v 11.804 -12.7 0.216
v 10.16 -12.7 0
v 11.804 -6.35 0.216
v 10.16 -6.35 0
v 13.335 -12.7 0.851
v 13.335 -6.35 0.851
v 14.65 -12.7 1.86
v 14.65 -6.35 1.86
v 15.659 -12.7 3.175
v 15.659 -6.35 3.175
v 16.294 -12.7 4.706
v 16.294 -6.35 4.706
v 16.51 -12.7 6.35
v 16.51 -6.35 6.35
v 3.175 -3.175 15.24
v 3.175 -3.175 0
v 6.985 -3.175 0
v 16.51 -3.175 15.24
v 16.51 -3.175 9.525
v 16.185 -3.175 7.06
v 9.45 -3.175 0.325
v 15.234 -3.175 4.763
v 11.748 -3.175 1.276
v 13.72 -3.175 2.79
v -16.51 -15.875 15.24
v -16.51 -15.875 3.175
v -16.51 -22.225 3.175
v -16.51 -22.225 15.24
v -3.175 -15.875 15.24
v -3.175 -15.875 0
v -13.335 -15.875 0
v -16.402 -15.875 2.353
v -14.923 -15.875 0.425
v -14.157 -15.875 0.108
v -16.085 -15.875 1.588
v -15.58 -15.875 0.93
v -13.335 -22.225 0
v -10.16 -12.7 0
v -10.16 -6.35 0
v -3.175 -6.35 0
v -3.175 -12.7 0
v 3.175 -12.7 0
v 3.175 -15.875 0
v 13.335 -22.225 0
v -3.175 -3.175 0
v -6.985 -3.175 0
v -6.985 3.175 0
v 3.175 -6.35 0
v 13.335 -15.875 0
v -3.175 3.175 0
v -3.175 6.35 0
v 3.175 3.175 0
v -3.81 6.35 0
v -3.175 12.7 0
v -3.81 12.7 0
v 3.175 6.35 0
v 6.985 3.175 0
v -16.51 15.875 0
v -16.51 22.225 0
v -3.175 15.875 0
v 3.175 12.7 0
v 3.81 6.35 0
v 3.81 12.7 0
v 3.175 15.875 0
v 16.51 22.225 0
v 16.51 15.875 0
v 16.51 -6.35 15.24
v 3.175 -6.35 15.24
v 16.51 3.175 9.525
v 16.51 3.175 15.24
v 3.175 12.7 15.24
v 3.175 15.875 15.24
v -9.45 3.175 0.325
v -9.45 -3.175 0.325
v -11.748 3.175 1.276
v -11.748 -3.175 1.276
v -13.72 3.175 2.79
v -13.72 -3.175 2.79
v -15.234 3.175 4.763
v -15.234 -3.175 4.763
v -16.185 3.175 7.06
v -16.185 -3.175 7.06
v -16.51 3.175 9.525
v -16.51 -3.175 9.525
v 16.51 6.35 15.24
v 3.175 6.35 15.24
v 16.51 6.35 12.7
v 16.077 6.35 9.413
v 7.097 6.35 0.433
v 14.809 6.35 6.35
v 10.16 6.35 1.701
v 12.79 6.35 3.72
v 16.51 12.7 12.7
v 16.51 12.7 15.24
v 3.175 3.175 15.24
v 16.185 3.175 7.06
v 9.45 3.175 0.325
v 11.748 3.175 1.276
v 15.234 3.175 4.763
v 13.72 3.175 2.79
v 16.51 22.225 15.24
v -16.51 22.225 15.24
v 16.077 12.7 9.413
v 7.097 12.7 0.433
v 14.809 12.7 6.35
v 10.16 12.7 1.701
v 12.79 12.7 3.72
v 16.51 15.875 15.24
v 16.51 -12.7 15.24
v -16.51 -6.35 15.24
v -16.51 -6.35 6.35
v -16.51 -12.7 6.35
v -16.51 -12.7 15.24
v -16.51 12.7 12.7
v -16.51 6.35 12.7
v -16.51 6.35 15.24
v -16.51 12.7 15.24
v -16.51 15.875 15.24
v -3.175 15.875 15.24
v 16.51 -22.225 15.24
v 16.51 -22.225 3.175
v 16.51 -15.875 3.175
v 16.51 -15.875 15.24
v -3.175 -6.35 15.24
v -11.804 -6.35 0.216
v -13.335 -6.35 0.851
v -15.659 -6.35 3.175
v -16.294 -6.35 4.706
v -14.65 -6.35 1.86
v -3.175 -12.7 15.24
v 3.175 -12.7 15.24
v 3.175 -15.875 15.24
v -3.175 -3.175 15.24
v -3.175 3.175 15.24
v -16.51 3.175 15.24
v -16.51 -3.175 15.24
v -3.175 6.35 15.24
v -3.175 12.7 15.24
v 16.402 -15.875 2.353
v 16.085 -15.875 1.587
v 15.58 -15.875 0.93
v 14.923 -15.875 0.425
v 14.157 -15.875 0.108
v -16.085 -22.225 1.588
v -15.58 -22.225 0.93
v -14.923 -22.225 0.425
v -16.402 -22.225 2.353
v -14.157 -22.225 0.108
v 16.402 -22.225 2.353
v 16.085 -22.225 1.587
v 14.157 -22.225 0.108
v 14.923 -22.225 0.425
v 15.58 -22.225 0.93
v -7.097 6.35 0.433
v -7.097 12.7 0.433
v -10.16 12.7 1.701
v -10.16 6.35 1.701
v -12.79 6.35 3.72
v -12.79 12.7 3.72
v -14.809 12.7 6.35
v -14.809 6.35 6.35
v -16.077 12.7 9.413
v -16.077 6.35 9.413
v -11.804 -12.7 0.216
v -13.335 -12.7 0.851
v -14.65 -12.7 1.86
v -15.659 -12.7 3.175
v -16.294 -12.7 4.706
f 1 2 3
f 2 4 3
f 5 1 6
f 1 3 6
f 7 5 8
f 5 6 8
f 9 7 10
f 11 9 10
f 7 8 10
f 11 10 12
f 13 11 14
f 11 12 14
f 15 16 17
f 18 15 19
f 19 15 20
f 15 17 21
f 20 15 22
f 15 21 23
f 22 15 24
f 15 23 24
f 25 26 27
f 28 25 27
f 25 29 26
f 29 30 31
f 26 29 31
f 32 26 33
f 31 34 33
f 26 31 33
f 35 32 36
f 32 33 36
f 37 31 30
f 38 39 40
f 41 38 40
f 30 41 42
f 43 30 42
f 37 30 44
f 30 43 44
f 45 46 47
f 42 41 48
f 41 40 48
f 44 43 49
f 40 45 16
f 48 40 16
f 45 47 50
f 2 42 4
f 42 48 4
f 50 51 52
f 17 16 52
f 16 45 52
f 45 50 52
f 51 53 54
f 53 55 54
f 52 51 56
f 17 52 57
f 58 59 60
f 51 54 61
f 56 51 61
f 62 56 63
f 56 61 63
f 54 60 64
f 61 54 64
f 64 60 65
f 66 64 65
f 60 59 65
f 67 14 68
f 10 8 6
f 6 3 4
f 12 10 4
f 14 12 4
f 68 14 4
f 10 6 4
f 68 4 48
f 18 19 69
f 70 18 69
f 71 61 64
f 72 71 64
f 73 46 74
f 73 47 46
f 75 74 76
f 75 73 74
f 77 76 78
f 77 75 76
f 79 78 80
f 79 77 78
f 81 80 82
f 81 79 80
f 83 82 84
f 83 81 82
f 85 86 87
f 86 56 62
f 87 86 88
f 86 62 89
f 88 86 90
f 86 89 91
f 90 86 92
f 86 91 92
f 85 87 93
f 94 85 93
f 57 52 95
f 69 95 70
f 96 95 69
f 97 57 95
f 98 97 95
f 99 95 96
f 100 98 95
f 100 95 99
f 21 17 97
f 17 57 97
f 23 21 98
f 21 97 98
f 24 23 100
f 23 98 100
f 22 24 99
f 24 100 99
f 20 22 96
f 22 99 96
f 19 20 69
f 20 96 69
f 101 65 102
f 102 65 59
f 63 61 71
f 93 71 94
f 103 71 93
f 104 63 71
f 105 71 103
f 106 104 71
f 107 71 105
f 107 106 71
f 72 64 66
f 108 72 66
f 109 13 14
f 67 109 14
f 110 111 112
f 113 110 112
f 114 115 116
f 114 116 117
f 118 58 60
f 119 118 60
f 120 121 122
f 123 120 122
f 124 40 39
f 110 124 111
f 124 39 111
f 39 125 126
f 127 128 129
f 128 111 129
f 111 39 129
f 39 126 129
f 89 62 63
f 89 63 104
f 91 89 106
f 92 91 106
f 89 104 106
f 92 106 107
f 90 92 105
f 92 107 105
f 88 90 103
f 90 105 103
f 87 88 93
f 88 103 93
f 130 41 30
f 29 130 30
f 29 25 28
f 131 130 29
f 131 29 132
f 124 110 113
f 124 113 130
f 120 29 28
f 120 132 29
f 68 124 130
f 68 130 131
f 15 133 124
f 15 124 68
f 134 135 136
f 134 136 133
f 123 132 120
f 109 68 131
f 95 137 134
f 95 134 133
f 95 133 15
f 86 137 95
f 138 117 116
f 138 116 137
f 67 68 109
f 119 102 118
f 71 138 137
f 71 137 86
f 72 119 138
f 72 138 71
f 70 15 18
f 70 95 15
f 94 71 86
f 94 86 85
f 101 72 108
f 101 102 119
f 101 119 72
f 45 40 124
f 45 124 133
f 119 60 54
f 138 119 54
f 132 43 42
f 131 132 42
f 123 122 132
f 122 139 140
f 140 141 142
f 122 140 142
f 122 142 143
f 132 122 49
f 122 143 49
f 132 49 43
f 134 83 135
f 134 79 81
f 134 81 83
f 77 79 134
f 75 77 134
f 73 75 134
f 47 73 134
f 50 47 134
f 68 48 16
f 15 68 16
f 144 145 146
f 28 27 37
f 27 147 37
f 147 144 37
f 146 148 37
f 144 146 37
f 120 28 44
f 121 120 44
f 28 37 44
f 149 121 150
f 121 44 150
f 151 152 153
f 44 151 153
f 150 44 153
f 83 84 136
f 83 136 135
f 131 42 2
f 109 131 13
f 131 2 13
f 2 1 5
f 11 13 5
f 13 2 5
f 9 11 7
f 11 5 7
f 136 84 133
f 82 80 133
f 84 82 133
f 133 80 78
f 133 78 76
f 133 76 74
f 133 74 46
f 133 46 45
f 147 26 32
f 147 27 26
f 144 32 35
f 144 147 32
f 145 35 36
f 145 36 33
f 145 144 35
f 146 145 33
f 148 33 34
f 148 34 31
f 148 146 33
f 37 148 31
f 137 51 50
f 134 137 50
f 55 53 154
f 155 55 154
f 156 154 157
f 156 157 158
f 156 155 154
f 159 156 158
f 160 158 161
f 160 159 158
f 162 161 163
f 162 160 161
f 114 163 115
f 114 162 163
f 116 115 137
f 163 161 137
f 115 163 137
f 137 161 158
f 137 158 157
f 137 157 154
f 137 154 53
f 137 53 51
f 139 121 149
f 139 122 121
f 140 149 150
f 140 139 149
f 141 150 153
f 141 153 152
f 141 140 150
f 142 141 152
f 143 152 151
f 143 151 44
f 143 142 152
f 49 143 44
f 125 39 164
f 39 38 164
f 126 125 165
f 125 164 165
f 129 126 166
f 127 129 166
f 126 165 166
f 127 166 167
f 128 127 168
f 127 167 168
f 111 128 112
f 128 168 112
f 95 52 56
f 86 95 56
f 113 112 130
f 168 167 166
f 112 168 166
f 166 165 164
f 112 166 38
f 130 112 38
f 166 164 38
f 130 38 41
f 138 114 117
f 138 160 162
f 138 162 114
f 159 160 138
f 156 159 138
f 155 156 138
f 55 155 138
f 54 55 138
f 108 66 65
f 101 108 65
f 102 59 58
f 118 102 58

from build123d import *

# Parameters (mm, degrees)
F0_W     = 6.35
F0_H     = 3.175
F0_H_2   = 6.35
F0_W_2   = 13.335
F1_DEPTH = 15.24
F2_R     = 3.175
F3_R     = 6.35
F4_R     = 9.525
F5_R     = 12.7


with BuildPart() as f1:
    # F0 (on Top) → F1 (new body)
    with BuildSketch(Plane.XY):
        Polygon((-16.51, 15.875), (-3.175, 15.875), (3.175, 15.875), (16.51, 15.875), (16.51, 22.225), (-16.51, 22.225), align=None)
        with Locations((0, 14.2875)):
            Rectangle(F0_W, F0_H)
        with Locations((0, 9.525)):
            Rectangle(F0_W, F0_H_2)
        with Locations((-9.8425, 9.525)):
            Rectangle(F0_W_2, F0_H_2)
        with Locations((9.8425, 9.525)):
            Rectangle(F0_W_2, F0_H_2)
        with Locations((0, 4.7625)):
            Rectangle(F0_W, F0_H)
        Rectangle(F0_W, F0_H_2)
        with Locations((9.8425, 0)):
            Rectangle(F0_W_2, F0_H_2)
        with Locations((-9.8425, 0)):
            Rectangle(F0_W_2, F0_H_2)
        with Locations((0, -4.7625)):
            Rectangle(F0_W, F0_H)
        Polygon((-3.175, -10.1355769231), (-3.175, -6.35), (-16.51, -6.35), (-16.51, -12.7), align=None)
        Polygon((3.175, -6.35), (-3.175, -6.35), (-3.175, -10.1355769231), (3.175, -8.9144230769), align=None)
        Polygon((16.51, -12.7), (16.51, -6.35), (3.175, -8.9144230769), (3.175, -12.7), align=None)
        with Locations((0, -14.2875)):
            Rectangle(F0_W, F0_H)
        Polygon((3.175, -15.875), (-3.175, -15.875), (-16.51, -15.875), (-16.51, -22.225), (16.51, -15.875), align=None)
        Polygon((3.175, -8.9144230769), (-3.175, -10.1355769231), (-3.175, -12.7), (3.175, -12.7), align=None)
        Polygon((-3.175, -12.7), (-3.175, -10.1355769231), (-16.51, -12.7), align=None)
        Polygon((16.51, -6.35), (3.175, -6.35), (3.175, -8.9144230769), align=None)
        Polygon((16.51, -22.225), (16.51, -15.875), (-16.51, -22.225), align=None)
    extrude(amount=F1_DEPTH)

    # F2
    f2_edges = [f1.edges().sort_by_distance(p)[0] for p in [
        (-16.51, -19.05, 0),
        (16.51, -19.05, 0),
    ]]
    fillet(f2_edges, radius=F2_R)

    # F3
    f3_edges = [f1.edges().sort_by_distance(p)[0] for p in [
        (-16.51, -9.525, 0),
        (16.51, -9.525, 0),
    ]]
    fillet(f3_edges, radius=F3_R)

    # F4
    f4_edges = [f1.edges().sort_by_distance(p)[0] for p in [
        (-16.51, 0, 0),
        (16.51, 0, 0),
    ]]
    fillet(f4_edges, radius=F4_R)

    # F5
    f5_edges = [f1.edges().sort_by_distance(p)[0] for p in [
        (16.51, 9.525, 0),
        (-16.51, 9.525, 0),
    ]]
    fillet(f5_edges, radius=F5_R)


solid = f1.part
